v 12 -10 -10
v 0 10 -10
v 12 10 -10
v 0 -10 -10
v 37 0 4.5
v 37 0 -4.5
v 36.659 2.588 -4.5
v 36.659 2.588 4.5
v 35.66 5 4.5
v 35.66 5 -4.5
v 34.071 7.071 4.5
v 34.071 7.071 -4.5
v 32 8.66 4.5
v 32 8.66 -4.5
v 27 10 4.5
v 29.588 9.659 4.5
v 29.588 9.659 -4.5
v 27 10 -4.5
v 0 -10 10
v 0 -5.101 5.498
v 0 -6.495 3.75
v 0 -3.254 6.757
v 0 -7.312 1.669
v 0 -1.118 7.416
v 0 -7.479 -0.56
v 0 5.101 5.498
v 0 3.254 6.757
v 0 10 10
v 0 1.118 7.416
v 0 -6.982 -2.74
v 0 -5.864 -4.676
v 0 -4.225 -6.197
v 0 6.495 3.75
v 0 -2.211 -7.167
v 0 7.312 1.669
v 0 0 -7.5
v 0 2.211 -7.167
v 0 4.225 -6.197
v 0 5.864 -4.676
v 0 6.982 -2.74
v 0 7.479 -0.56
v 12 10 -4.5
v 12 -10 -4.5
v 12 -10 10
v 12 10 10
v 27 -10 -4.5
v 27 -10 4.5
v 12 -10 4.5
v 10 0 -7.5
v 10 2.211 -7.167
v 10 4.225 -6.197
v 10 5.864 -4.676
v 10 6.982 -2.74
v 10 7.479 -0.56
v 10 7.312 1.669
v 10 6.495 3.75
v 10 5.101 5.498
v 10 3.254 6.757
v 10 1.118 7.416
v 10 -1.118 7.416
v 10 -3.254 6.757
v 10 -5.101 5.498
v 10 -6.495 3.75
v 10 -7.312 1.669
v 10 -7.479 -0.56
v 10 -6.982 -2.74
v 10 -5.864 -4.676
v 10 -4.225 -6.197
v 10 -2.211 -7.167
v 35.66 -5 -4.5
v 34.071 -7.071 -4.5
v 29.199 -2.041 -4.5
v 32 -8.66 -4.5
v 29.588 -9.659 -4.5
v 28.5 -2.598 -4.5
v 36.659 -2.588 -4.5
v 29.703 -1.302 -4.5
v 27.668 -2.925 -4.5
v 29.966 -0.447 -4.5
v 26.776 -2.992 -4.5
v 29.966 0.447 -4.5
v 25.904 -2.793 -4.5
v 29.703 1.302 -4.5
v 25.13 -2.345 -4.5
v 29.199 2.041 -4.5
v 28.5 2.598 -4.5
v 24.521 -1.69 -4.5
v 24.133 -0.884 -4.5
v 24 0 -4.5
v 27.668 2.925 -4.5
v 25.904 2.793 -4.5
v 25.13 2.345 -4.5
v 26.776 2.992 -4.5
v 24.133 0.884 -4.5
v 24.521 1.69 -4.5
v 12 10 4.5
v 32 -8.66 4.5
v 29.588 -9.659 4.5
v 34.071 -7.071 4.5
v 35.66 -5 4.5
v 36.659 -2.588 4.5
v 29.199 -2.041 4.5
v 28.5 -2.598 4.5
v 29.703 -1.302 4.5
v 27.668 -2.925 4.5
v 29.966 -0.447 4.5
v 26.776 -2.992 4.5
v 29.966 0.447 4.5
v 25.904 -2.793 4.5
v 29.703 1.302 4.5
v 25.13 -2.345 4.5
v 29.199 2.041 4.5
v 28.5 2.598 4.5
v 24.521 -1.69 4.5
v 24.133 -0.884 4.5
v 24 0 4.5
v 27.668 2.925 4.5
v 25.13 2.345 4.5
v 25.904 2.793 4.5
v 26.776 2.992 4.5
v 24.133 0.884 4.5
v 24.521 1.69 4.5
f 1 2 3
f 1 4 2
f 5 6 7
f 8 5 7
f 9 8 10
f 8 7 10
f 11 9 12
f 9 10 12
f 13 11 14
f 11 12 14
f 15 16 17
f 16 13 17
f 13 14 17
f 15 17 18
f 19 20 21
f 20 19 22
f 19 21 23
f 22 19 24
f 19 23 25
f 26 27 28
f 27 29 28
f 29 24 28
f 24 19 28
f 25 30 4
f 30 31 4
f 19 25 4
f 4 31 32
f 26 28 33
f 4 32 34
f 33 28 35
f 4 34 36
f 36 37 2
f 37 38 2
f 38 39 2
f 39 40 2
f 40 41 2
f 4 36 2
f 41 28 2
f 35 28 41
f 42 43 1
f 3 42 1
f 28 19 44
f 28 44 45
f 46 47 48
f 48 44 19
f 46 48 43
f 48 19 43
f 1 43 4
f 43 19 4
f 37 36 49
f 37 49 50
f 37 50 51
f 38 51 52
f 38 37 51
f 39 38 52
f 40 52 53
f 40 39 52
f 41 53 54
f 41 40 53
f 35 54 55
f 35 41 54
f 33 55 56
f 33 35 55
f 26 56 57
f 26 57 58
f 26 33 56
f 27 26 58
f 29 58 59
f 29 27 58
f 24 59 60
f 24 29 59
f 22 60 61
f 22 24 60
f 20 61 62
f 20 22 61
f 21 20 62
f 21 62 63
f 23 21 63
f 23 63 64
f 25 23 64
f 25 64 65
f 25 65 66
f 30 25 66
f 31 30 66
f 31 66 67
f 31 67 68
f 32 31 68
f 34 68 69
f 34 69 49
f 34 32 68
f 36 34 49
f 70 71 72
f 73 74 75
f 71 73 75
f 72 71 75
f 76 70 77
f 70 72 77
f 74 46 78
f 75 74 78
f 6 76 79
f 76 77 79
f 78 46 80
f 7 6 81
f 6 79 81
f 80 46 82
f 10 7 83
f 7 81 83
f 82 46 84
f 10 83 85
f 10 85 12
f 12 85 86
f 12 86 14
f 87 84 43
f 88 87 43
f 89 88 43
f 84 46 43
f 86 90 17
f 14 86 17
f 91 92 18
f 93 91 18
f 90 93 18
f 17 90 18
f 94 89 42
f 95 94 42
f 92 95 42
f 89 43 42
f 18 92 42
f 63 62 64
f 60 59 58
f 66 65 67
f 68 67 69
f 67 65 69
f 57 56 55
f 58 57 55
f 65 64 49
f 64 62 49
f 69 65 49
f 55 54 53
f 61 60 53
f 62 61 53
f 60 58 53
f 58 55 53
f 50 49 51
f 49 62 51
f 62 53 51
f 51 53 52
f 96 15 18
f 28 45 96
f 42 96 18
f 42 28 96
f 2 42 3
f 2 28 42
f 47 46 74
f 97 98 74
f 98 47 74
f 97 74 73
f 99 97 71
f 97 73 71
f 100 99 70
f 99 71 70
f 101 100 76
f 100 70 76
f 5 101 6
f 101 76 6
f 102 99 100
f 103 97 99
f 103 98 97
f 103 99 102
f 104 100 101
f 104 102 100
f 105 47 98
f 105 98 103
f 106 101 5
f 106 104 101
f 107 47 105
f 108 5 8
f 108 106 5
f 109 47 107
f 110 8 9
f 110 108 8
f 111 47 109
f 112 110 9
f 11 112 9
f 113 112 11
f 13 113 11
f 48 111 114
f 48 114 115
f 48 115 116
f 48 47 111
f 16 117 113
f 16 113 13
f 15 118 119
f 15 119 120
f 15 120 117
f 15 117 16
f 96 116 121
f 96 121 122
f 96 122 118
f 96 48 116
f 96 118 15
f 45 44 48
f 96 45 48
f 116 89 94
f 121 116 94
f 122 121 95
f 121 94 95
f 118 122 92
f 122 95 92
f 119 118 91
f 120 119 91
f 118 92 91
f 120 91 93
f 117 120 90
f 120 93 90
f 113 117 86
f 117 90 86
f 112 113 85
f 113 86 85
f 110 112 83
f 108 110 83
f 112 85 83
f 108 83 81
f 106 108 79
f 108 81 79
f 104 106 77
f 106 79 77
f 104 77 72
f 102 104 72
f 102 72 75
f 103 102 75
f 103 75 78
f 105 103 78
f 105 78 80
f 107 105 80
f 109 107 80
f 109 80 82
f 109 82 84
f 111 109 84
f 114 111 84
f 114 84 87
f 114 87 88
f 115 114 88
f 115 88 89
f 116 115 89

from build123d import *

# Parameters (mm, degrees)
SKETCH_1_W           = 20
SKETCH_1_H           = 20
SKETCH_1_R           = 7.5
EXTRUDE_1_DEPTH      = 10
EXTRUDE_2_DEPTH      = 0.0001
EXTRUDE_2_DEPTH_BACK = 10
SKETCH_2_W           = 5
SKETCH_2_H           = 2
SKETCH_3_R           = 1.5
CUT_EXTRUDE_1_DEPTH  = 27.925861175
SKETCH_4_W           = 20
SKETCH_4_H           = 20
EXTRUDE_3_DEPTH      = 2
SKETCH_5_W           = 9
SKETCH_5_H           = 20
EXTRUDE_4_DEPTH      = 25
SKETCH_7_R           = 3
CUT_EXTRUDE_2_DEPTH  = 10
CUT_EXTRUDE_3_DEPTH  = 10
SKETCH_9_W           = 10.0001
SKETCH_9_H           = 5
CUT_EXTRUDE_4_DEPTH  = 45.654227124


with BuildPart() as part:
    # 草图1 → 凸台-拉伸1 (new body)
    with BuildSketch(Plane(origin=(0, 0, 0), x_dir=(0, 0, -1), z_dir=(1, 0, 0))):
        Rectangle(SKETCH_1_W, SKETCH_1_H)
        Circle(SKETCH_1_R, mode=Mode.SUBTRACT)
    extrude(amount=EXTRUDE_1_DEPTH)

    # 草图2 → 凸台-拉伸2 (add, two sides: drawn at the far end of the back side and taken through both)
    with BuildSketch(Plane(origin=(10, 0, 0), x_dir=(0, 0, -1), z_dir=(1, 0, 0)).offset(-EXTRUDE_2_DEPTH_BACK)):
        with Locations((-12.5, 9)):
            Rectangle(SKETCH_2_W, SKETCH_2_H)
        with Locations((-12.5, -9)):
            Rectangle(SKETCH_2_W, SKETCH_2_H)
        with Locations((12.5, -9)):
            Rectangle(SKETCH_2_W, SKETCH_2_H)
        with Locations((12.5, 9)):
            Rectangle(SKETCH_2_W, SKETCH_2_H)
    extrude(amount=EXTRUDE_2_DEPTH + EXTRUDE_2_DEPTH_BACK)

    # 草图3 → 切除-拉伸1 (cut, through all)
    with BuildSketch(Plane(origin=(0, 10, 0), x_dir=(1, 0, 0), z_dir=(0, 1, 0))):
        with Locations(Location((5.00005, 12.5, 0), (0, 0, 270))):
            Circle(SKETCH_3_R)
        with Locations(Location((5.00005, -12.5, 0), (0, 0, 270))):
            Circle(SKETCH_3_R)
    extrude(amount=-CUT_EXTRUDE_1_DEPTH, mode=Mode.SUBTRACT)

    # 草图4 → 凸台-拉伸3 (add)
    with BuildSketch(Plane(origin=(10, 0, 0), x_dir=(0, 0, -1), z_dir=(1, 0, 0))):
        Rectangle(SKETCH_4_W, SKETCH_4_H)
    extrude(amount=EXTRUDE_3_DEPTH)

    # 草图5 → 凸台-拉伸4 (add)
    with BuildSketch(Plane(origin=(12, 0, 0), x_dir=(0, 0, -1), z_dir=(1, 0, 0))):
        Rectangle(SKETCH_5_W, SKETCH_5_H)
    extrude(amount=EXTRUDE_4_DEPTH)

    # 草图7 → 切除-拉伸2 (cut)
    with BuildSketch(Plane(origin=(0, 0, -4.5), x_dir=(-1, 0, 0), z_dir=(0, 0, -1))):
        with Locations((-27, 0)):
            Circle(SKETCH_7_R)
    extrude(amount=-CUT_EXTRUDE_2_DEPTH, mode=Mode.SUBTRACT)

    # 草图8 → 切除-拉伸3 (cut)
    with BuildSketch(Plane(origin=(0, 0, -4.5), x_dir=(-1, 0, 0), z_dir=(0, 0, -1))):
        with BuildLine():
            Line((-37, -10), (-27, -10))
            ThreePointArc((-27, -10), (-34.071067812, -7.071067812), (-37, 0))
            Line((-37, 0), (-37, -10))
        make_face()
        with BuildLine():
            Line((-37, 10), (-37, 0))
            ThreePointArc((-37, 0), (-34.071067812, 7.071067812), (-27, 10))
            Line((-27, 10), (-37, 10))
        make_face()
    extrude(amount=-CUT_EXTRUDE_3_DEPTH, mode=Mode.SUBTRACT)

    # 草图9 → 切除-拉伸4 (cut, through all)
    with BuildSketch(Plane.XZ.offset(10)):
        with Locations((5.00005, -12.5)):
            Rectangle(SKETCH_9_W, SKETCH_9_H)
        with Locations((5.00005, 12.5)):
            Rectangle(SKETCH_9_W, SKETCH_9_H)
    extrude(amount=-CUT_EXTRUDE_4_DEPTH, mode=Mode.SUBTRACT)


solid = part.part
